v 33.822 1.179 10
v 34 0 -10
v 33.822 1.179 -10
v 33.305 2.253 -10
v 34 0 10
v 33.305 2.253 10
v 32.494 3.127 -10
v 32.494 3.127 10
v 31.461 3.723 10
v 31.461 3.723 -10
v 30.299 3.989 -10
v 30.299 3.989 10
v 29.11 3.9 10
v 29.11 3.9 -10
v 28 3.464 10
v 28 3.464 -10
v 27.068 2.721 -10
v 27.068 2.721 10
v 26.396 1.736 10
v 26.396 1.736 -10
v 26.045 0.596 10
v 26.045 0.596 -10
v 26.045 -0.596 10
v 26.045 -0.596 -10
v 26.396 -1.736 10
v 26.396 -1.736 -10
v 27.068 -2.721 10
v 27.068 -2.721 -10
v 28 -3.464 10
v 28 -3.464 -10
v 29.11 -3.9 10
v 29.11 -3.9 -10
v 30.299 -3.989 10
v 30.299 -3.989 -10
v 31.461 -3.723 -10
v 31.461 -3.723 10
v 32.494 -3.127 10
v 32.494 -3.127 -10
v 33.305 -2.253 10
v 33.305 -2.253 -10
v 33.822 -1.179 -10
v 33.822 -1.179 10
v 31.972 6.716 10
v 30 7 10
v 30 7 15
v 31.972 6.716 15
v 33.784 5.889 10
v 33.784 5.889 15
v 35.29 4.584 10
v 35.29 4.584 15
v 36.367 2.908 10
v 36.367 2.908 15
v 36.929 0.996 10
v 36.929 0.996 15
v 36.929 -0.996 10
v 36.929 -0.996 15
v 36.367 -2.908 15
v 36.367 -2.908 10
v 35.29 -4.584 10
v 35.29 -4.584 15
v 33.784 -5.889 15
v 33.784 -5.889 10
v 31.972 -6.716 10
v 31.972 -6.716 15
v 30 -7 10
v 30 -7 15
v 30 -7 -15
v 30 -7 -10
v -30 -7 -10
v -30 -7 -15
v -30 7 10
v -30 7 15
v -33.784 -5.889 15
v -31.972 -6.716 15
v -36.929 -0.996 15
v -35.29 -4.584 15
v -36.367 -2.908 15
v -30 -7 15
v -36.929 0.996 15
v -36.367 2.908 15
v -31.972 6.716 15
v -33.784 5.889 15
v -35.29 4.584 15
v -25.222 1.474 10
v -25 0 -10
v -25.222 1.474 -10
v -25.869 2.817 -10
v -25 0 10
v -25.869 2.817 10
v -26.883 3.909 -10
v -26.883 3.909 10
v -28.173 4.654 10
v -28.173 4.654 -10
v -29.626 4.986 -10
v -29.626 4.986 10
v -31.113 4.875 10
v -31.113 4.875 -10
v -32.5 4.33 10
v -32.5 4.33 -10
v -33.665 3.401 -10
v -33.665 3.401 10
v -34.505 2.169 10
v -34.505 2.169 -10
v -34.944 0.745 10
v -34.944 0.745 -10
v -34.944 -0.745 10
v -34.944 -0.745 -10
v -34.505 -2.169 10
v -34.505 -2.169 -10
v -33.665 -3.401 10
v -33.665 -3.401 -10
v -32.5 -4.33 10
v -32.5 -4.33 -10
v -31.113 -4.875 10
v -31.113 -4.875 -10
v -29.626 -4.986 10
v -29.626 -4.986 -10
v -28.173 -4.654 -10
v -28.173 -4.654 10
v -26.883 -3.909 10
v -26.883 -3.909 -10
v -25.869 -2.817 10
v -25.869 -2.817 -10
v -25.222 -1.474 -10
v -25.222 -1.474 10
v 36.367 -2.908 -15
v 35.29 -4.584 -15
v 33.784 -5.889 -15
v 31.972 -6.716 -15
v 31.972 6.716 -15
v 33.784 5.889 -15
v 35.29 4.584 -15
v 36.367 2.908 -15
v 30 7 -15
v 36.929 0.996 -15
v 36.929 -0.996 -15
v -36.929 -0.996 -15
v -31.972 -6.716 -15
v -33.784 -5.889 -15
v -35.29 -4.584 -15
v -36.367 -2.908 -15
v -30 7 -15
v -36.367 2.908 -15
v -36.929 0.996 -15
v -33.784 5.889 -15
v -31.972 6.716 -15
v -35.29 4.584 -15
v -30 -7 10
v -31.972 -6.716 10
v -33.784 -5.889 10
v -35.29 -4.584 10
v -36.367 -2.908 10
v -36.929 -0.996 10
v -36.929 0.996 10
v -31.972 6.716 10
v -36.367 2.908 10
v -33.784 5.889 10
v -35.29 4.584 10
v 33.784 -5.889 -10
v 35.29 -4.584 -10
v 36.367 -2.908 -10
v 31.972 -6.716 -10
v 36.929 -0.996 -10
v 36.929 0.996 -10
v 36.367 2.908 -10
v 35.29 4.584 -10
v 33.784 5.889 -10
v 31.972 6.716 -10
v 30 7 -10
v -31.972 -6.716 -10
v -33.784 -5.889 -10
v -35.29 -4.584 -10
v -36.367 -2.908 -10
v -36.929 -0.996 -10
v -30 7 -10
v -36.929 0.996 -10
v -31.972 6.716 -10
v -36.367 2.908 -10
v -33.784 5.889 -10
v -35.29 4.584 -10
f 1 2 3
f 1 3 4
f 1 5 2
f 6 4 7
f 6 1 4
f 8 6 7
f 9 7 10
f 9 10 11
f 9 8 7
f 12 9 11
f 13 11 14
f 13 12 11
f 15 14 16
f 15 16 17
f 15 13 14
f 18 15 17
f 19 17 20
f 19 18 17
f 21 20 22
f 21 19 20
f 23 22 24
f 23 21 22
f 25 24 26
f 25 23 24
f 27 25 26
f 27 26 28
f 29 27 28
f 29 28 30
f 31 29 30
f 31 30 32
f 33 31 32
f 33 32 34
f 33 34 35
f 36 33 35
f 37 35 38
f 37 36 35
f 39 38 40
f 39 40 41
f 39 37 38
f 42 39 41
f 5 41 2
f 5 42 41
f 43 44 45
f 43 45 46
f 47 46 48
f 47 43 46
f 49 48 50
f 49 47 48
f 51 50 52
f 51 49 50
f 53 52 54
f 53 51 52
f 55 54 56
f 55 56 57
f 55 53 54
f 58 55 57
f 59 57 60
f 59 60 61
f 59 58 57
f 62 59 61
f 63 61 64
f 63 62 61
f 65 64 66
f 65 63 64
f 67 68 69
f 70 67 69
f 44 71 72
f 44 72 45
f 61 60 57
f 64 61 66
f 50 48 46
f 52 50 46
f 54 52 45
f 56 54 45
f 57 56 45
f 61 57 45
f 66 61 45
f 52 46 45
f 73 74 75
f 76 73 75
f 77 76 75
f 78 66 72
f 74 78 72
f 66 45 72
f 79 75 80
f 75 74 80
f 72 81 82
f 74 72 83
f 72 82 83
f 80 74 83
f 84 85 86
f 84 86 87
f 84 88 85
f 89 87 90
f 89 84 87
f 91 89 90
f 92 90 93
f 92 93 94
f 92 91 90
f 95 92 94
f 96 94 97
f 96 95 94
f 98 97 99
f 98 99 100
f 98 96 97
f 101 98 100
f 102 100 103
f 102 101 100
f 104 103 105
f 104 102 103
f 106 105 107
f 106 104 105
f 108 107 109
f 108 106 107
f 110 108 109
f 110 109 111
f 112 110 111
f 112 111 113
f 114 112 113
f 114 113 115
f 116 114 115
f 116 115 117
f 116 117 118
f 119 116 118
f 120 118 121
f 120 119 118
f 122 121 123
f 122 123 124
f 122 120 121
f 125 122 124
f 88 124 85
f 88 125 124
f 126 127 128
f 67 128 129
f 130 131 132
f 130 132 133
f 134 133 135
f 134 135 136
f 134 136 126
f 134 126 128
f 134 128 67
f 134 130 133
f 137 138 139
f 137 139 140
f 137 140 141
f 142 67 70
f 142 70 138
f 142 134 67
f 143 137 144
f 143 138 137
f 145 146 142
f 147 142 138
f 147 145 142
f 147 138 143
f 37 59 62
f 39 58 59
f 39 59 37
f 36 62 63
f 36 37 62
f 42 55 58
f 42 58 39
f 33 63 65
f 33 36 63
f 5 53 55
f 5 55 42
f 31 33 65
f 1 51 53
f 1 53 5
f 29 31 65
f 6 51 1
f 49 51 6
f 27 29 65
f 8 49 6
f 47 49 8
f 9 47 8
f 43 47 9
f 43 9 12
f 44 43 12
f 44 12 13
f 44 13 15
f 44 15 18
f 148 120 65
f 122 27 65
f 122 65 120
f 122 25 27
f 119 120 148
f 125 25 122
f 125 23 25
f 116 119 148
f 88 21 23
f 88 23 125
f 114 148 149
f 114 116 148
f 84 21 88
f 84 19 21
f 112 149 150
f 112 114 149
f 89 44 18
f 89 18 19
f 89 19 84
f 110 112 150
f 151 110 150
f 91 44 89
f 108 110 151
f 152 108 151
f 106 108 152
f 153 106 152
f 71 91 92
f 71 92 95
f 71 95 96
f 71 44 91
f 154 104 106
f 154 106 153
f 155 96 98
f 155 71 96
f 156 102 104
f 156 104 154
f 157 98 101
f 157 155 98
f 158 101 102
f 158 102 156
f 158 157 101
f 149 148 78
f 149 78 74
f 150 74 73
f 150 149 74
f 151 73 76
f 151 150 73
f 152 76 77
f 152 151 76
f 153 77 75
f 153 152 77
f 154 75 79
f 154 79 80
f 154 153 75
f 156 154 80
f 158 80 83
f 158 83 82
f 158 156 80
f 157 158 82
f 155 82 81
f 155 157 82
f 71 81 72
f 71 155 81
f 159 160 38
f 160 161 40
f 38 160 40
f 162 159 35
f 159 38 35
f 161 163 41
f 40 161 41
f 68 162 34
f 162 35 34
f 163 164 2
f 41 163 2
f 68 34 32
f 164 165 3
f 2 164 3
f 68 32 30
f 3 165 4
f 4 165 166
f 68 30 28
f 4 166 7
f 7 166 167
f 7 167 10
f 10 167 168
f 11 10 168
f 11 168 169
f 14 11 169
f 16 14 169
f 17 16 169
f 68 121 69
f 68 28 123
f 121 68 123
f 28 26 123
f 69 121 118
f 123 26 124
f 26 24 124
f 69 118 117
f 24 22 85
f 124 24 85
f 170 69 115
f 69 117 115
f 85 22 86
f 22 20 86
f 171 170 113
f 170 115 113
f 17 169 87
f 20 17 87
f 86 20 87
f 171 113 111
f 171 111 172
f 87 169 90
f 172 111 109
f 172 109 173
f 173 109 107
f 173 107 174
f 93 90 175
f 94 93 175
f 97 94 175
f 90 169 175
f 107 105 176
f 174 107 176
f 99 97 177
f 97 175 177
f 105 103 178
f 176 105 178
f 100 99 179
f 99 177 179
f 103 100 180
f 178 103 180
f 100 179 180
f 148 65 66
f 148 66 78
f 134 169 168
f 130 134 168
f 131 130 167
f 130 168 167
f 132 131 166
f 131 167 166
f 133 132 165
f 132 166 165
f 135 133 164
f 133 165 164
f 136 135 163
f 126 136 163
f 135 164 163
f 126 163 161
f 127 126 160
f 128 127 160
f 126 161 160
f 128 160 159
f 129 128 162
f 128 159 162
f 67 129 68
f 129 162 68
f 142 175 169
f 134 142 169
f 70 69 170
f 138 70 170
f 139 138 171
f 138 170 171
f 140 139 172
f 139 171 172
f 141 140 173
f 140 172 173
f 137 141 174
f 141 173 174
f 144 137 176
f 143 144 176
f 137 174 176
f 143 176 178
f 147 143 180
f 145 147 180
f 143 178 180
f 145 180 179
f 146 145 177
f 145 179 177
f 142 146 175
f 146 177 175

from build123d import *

# Parameters (mm, degrees)
SALIENTE_EXTRUIR1_DEPTH        = 10
SALIENTE_EXTRUIR1_DEPTH_BACK   = 10
CROQUIS1_R                     = 5
SALIENTE_EXTRUIR1_2_DEPTH      = 10
SALIENTE_EXTRUIR1_2_DEPTH_BACK = 10
CROQUIS1_R_2                   = 4
SALIENTE_EXTRUIR2_DEPTH        = 5


with BuildPart() as part:
    # Croquis1 → Saliente-Extruir1 (new, two sides: drawn at the far end of the back side and taken through both)
    with BuildSketch(Plane.XY.offset(-SALIENTE_EXTRUIR1_DEPTH_BACK)):
        with Locations((-30, 0)):
            Circle(CROQUIS1_R)
    extrude(amount=SALIENTE_EXTRUIR1_DEPTH + SALIENTE_EXTRUIR1_DEPTH_BACK)



with BuildPart() as body_2:
    # Croquis1 → Saliente-Extruir1 2 (new, two sides: drawn at the far end of the back side and taken through both)
    with BuildSketch(Plane.XY.offset(-SALIENTE_EXTRUIR1_2_DEPTH_BACK)):
        with Locations((30, 0)):
            Circle(CROQUIS1_R_2)
    extrude(amount=SALIENTE_EXTRUIR1_2_DEPTH + SALIENTE_EXTRUIR1_2_DEPTH_BACK)


with BuildPart() as part_1:
    add(part.part)

    add(body_2.part)  # Saliente-Extruir2 merges body 2
    # Croquis2 → Saliente-Extruir2 (add)
    with BuildSketch(Plane.XY.offset(10)):
        with BuildLine():
            Line((-30, 7), (30, 7))
            ThreePointArc((30, 7), (37, 0), (30, -7))
            Line((30, -7), (-30, -7))
            ThreePointArc((-30, -7), (-37, 0), (-30, 7))
        make_face()
    saliente_extruir2 = extrude(amount=SALIENTE_EXTRUIR2_DEPTH)

    # Simetría1: Saliente-Extruir2 across plane
    add(saliente_extruir2.mirror(Plane.XY))


solid = part_1.part
